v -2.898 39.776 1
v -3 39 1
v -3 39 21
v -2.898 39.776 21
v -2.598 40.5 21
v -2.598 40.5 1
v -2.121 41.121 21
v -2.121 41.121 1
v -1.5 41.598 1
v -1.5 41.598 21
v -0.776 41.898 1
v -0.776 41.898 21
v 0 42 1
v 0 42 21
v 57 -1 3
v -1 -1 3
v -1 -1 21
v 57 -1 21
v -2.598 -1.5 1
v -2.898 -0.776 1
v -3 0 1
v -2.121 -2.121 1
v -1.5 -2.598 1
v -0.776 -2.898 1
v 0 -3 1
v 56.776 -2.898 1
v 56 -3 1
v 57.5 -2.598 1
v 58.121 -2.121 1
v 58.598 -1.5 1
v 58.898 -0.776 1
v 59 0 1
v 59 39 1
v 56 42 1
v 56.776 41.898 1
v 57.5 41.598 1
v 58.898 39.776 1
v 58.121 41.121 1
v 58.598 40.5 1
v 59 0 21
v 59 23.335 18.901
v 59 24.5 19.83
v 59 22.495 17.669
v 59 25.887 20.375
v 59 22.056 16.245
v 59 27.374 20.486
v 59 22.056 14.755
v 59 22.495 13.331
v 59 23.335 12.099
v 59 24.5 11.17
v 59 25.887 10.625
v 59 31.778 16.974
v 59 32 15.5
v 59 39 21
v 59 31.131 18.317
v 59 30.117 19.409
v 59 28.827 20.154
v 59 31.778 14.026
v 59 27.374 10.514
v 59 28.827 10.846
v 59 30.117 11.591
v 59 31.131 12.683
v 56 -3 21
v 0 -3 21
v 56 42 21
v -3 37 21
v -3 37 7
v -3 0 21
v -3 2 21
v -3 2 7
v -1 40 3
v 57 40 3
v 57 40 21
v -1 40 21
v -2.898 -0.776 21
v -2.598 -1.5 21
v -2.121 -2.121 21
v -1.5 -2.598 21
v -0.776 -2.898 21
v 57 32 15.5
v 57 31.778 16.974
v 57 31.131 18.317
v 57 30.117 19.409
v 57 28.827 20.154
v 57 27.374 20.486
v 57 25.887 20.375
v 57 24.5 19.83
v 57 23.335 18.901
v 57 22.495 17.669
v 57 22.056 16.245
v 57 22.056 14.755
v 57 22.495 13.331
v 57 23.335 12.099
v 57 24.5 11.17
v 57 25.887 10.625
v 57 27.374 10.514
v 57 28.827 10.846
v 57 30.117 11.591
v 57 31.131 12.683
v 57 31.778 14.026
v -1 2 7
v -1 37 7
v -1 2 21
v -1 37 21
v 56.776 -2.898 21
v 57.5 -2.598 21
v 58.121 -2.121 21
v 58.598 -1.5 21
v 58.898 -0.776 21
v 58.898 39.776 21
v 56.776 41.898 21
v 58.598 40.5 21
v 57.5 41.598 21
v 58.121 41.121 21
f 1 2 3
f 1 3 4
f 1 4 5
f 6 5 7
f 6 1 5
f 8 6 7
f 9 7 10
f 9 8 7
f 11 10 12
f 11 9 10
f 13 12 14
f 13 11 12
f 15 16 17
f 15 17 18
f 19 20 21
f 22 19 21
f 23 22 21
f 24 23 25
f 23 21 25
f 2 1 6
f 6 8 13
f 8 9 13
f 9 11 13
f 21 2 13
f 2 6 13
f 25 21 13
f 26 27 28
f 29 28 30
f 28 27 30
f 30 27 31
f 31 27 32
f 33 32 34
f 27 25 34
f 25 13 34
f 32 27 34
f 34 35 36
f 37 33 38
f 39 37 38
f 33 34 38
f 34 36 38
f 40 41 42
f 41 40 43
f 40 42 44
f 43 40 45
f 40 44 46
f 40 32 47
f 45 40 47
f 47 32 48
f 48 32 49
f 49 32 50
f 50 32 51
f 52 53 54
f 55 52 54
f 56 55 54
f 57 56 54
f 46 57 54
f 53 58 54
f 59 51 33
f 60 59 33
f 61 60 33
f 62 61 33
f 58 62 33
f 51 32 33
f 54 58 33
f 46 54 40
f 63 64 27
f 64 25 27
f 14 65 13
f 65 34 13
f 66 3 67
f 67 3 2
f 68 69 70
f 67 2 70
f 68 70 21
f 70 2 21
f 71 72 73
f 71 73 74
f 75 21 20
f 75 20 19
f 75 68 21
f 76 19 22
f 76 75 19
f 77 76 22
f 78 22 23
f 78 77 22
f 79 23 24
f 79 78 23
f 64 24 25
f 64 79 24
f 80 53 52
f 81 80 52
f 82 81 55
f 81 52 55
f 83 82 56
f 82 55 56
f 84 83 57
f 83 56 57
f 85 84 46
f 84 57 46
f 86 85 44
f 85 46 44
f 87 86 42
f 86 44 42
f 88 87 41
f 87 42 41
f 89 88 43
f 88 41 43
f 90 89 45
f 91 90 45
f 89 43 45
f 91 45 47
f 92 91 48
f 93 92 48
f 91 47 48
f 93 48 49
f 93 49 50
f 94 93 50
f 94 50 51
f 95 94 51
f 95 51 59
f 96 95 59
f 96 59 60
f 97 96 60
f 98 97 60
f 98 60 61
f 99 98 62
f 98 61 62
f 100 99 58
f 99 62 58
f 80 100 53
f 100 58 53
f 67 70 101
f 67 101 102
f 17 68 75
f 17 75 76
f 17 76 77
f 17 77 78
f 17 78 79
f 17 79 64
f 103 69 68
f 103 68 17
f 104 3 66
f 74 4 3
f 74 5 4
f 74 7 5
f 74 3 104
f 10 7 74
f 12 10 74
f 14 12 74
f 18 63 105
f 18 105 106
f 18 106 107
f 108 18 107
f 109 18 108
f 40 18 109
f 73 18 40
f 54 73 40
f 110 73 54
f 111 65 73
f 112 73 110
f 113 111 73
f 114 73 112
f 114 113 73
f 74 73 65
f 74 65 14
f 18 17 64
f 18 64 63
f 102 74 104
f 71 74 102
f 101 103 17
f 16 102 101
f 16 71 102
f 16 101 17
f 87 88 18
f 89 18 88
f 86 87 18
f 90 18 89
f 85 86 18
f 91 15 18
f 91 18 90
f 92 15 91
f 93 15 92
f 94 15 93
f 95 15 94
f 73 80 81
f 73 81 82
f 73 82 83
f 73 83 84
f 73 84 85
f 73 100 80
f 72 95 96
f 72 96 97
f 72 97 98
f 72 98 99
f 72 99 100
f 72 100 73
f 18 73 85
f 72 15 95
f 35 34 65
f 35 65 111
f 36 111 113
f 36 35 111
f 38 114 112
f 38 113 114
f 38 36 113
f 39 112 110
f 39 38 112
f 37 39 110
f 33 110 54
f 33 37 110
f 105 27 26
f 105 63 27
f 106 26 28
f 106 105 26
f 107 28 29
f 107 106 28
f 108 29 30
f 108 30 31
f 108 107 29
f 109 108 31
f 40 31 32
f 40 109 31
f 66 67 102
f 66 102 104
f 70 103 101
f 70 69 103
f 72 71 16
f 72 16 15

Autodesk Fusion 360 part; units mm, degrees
sketch "Sketch1" plane through (0, 0, 0) normal (0, 0, 1) x (1, 0, 0)
  line L0 (-1, -1) -> (57, -1)
  line L1 (57, -1) -> (57, 40)
  line L2 (57, 40) -> (-1, 40)
  line L3 (-1, 40) -> (-1, -1)
  line L4 (-3, -3) -> (59, -3)
  line L5 (59, -3) -> (59, 42)
  line L6 (59, 42) -> (-3, 42)
  line L7 (-3, 42) -> (-3, -3)
extrude "Extrude1" add sketch "Sketch1" along normal blind 3 contours L0 L1 L2 L3 | L4 L5 L6 L7
extrude "Extrude2" add sketch "Sketch1" along normal blind 21
sketch "Sketch2" plane through (59, 0, 0) normal (1, 0, 0) x (0, 1, 0)
  line L0 (-3, 0) -> (42, 0)
  line L1 (42, 0) -> (42, 21)
  line L2 (42, 21) -> (-3, 21)
  line L3 (-3, 21) -> (-3, 0)
  line L4 (42, 0) -> (42, 15.5) construction
  line L5 (42, 15.5) -> (27, 15.5) construction
  circle A0 centre (27, 15.5) radius 5
  dimension "d11" = 15
extrude "Extrude3" cut sketch "Sketch2" against normal blind 3 contours A0
sketch "Sketch3" plane through (-3, 0, 0) normal (-1, 0, 0) x (0, -1, 0)
  line L0 (-42, 0) -> (3, 0)
  line L1 (3, 0) -> (3, 21)
  line L2 (3, 21) -> (-42, 21)
  line L3 (-42, 21) -> (-42, 0)
  line L4 (-37, 7) -> (-37, 21)
  line L5 (-37, 21) -> (-2, 21)
  line L6 (-2, 21) -> (-2, 7)
  line L7 (-2, 7) -> (-37, 7)
extrude "Extrude4" cut sketch "Sketch3" against normal blind 3 contours L2 L4 L5 L6 L7
fillet "Fillet1" radius 3 4 edges at (59, -3, 10.5) (59, 42, 10.5) (-3, 42, 10.5) (-3, -3, 10.5)
sketch "Sketch4" plane through (0, 0, 3) normal (0, 0, 1) x (-1, 0, 0)
  line L0 (1, 1) -> (-57, 1)
  line L1 (-57, 1) -> (-57, -40)
  line L2 (-57, -40) -> (1, -40)
  line L3 (1, -40) -> (1, 1)
  point P0 (-29.8405, -19.6761)
extrude "Extrude5" cut 1 faces at (37.3333, 12, 0) along direction (0, 0, 1) blind 1
sketch "Sketch5" plane through (0, 0, 3) normal (0, 0, 1) x (-1, 0, 0)
  line L0 (-8.2346, 0) -> (-7.3686, -1.5)
  line L1 (-7.3686, -1.5) -> (-5.0592, -1.5)
  line L2 (-5.0592, -1.5) -> (-4.1932, 0)
  line L3 (-0.7291, 0) -> (-3.0385, 0)
  line L4 (-3.0385, 0) -> (-4.1932, -2)
  line L5 (-4.1932, -2) -> (-3.0385, -4)
  line L6 (-3.0385, -4) -> (-0.7291, -4)
  line L7 (-0.7291, -4) -> (0, -2.7372)
  line L8 (0, -1.2628) -> (-0.7291, 0)
  line L9 (-16.8949, 0) -> (-16.0289, -1.5)
  line L10 (-16.0289, -1.5) -> (-13.7195, -1.5)
  line L11 (-13.7195, -1.5) -> (-12.8534, 0)
  line L12 (-9.3893, 0) -> (-11.6987, 0)
  line L13 (-11.6987, 0) -> (-12.8534, -2)
  line L14 (-12.8534, -2) -> (-11.6987, -4)
  line L15 (-11.6987, -4) -> (-9.3893, -4)
  line L16 (-9.3893, -4) -> (-8.2346, -2)
  line L17 (-8.2346, -2) -> (-9.3893, 0)
  line L18 (-5.0592, -2.5) -> (-7.3686, -2.5)
  line L19 (-7.3686, -2.5) -> (-8.5233, -4.5)
  line L20 (-8.5233, -4.5) -> (-7.3686, -6.5)
  line L21 (-7.3686, -6.5) -> (-5.0592, -6.5)
  line L22 (-5.0592, -6.5) -> (-3.9045, -4.5)
  line L23 (-3.9045, -4.5) -> (-5.0592, -2.5)
  line L24 (-0.7291, -5) -> (-3.0385, -5)
  line L25 (-3.0385, -5) -> (-4.1932, -7)
  line L26 (-4.1932, -7) -> (-3.0385, -9)
  line L27 (-3.0385, -9) -> (-0.7291, -9)
  line L28 (-0.7291, -9) -> (0, -7.7372)
  line L29 (0, -6.2628) -> (-0.7291, -5)
  line L30 (-25.5551, 0) -> (-24.6891, -1.5)
  line L31 (-24.6891, -1.5) -> (-22.3797, -1.5)
  line L32 (-22.3797, -1.5) -> (-21.5137, 0)
  line L33 (-18.0496, 0) -> (-20.359, 0)
  line L34 (-20.359, 0) -> (-21.5137, -2)
  line L35 (-21.5137, -2) -> (-20.359, -4)
  line L36 (-20.359, -4) -> (-18.0496, -4)
  line L37 (-18.0496, -4) -> (-16.8949, -2)
  line L38 (-16.8949, -2) -> (-18.0496, 0)
  line L39 (-13.7195, -2.5) -> (-16.0289, -2.5)
  line L40 (-16.0289, -2.5) -> (-17.1836, -4.5)
  line L41 (-17.1836, -4.5) -> (-16.0289, -6.5)
  line L42 (-16.0289, -6.5) -> (-13.7195, -6.5)
  line L43 (-13.7195, -6.5) -> (-12.5648, -4.5)
  line L44 (-12.5648, -4.5) -> (-13.7195, -2.5)
  line L45 (-9.3893, -5) -> (-11.6987, -5)
  line L46 (-11.6987, -5) -> (-12.8534, -7)
  line L47 (-12.8534, -7) -> (-11.6987, -9)
  line L48 (-11.6987, -9) -> (-9.3893, -9)
  line L49 (-9.3893, -9) -> (-8.2346, -7)
  line L50 (-8.2346, -7) -> (-9.3893, -5)
  line L51 (-5.0592, -7.5) -> (-7.3686, -7.5)
  line L52 (-7.3686, -7.5) -> (-8.5233, -9.5)
  line L53 (-8.5233, -9.5) -> (-7.3686, -11.5)
  line L54 (-7.3686, -11.5) -> (-5.0592, -11.5)
  line L55 (-5.0592, -11.5) -> (-3.9045, -9.5)
  line L56 (-3.9045, -9.5) -> (-5.0592, -7.5)
  line L57 (-0.7291, -10) -> (-3.0385, -10)
  line L58 (-3.0385, -10) -> (-4.1932, -12)
  line L59 (-4.1932, -12) -> (-3.0385, -14)
  line L60 (-3.0385, -14) -> (-0.7291, -14)
  line L61 (-0.7291, -14) -> (0, -12.7372)
  line L62 (0, -11.2628) -> (-0.7291, -10)
  line L63 (-34.2154, 0) -> (-33.3494, -1.5)
  line L64 (-33.3494, -1.5) -> (-31.04, -1.5)
  line L65 (-31.04, -1.5) -> (-30.1739, 0)
  line L66 (-26.7098, 0) -> (-29.0192, 0)
  line L67 (-29.0192, 0) -> (-30.1739, -2)
  line L68 (-30.1739, -2) -> (-29.0192, -4)
  line L69 (-29.0192, -4) -> (-26.7098, -4)
  line L70 (-26.7098, -4) -> (-25.5551, -2)
  line L71 (-25.5551, -2) -> (-26.7098, 0)
  line L72 (-22.3797, -2.5) -> (-24.6891, -2.5)
  line L73 (-24.6891, -2.5) -> (-25.8438, -4.5)
  line L74 (-25.8438, -4.5) -> (-24.6891, -6.5)
  line L75 (-24.6891, -6.5) -> (-22.3797, -6.5)
  line L76 (-22.3797, -6.5) -> (-21.225, -4.5)
  line L77 (-21.225, -4.5) -> (-22.3797, -2.5)
  line L78 (-18.0496, -5) -> (-20.359, -5)
  line L79 (-20.359, -5) -> (-21.5137, -7)
  line L80 (-21.5137, -7) -> (-20.359, -9)
  line L81 (-20.359, -9) -> (-18.0496, -9)
  line L82 (-18.0496, -9) -> (-16.8949, -7)
  line L83 (-16.8949, -7) -> (-18.0496, -5)
  line L84 (-13.7195, -7.5) -> (-16.0289, -7.5)
  line L85 (-16.0289, -7.5) -> (-17.1836, -9.5)
  line L86 (-17.1836, -9.5) -> (-16.0289, -11.5)
  line L87 (-16.0289, -11.5) -> (-13.7195, -11.5)
  line L88 (-13.7195, -11.5) -> (-12.5648, -9.5)
  line L89 (-12.5648, -9.5) -> (-13.7195, -7.5)
  line L90 (-9.3893, -10) -> (-11.6987, -10)
  line L91 (-11.6987, -10) -> (-12.8534, -12)
  line L92 (-12.8534, -12) -> (-11.6987, -14)
  line L93 (-11.6987, -14) -> (-9.3893, -14)
  line L94 (-9.3893, -14) -> (-8.2346, -12)
  line L95 (-8.2346, -12) -> (-9.3893, -10)
  line L96 (-5.0592, -12.5) -> (-7.3686, -12.5)
  line L97 (-7.3686, -12.5) -> (-8.5233, -14.5)
  line L98 (-8.5233, -14.5) -> (-7.3686, -16.5)
  line L99 (-7.3686, -16.5) -> (-5.0592, -16.5)
  line L100 (-5.0592, -16.5) -> (-3.9045, -14.5)
  line L101 (-3.9045, -14.5) -> (-5.0592, -12.5)
  line L102 (-0.7291, -15) -> (-3.0385, -15)
  line L103 (-3.0385, -15) -> (-4.1932, -17)
  line L104 (-4.1932, -17) -> (-3.0385, -19)
  line L105 (-3.0385, -19) -> (-0.7291, -19)
  line L106 (-0.7291, -19) -> (0, -17.7372)
  line L107 (0, -16.2628) -> (-0.7291, -15)
  line L108 (-42.8756, 0) -> (-42.0096, -1.5)
  line L109 (-42.0096, -1.5) -> (-39.7002, -1.5)
  line L110 (-39.7002, -1.5) -> (-38.8342, 0)
  line L111 (-35.3701, 0) -> (-37.6795, 0)
  line L112 (-37.6795, 0) -> (-38.8342, -2)
  line L113 (-38.8342, -2) -> (-37.6795, -4)
  line L114 (-37.6795, -4) -> (-35.3701, -4)
  line L115 (-35.3701, -4) -> (-34.2154, -2)
  line L116 (-34.2154, -2) -> (-35.3701, 0)
  line L117 (-31.04, -2.5) -> (-33.3494, -2.5)
  line L118 (-33.3494, -2.5) -> (-34.5041, -4.5)
  line L119 (-34.5041, -4.5) -> (-33.3494, -6.5)
  line L120 (-33.3494, -6.5) -> (-31.04, -6.5)
  line L121 (-31.04, -6.5) -> (-29.8853, -4.5)
  line L122 (-29.8853, -4.5) -> (-31.04, -2.5)
  line L123 (-26.7098, -5) -> (-29.0192, -5)
  line L124 (-29.0192, -5) -> (-30.1739, -7)
  line L125 (-30.1739, -7) -> (-29.0192, -9)
  line L126 (-29.0192, -9) -> (-26.7098, -9)
  line L127 (-26.7098, -9) -> (-25.5551, -7)
  line L128 (-25.5551, -7) -> (-26.7098, -5)
  line L129 (-22.3797, -7.5) -> (-24.6891, -7.5)
  line L130 (-24.6891, -7.5) -> (-25.8438, -9.5)
  line L131 (-25.8438, -9.5) -> (-24.6891, -11.5)
  line L132 (-24.6891, -11.5) -> (-22.3797, -11.5)
  line L133 (-22.3797, -11.5) -> (-21.225, -9.5)
  line L134 (-21.225, -9.5) -> (-22.3797, -7.5)
  line L135 (-18.0496, -10) -> (-20.359, -10)
  line L136 (-20.359, -10) -> (-21.5137, -12)
  line L137 (-21.5137, -12) -> (-20.359, -14)
  line L138 (-20.359, -14) -> (-18.0496, -14)
  line L139 (-18.0496, -14) -> (-16.8949, -12)
  line L140 (-16.8949, -12) -> (-18.0496, -10)
  line L141 (-13.7195, -12.5) -> (-16.0289, -12.5)
  line L142 (-16.0289, -12.5) -> (-17.1836, -14.5)
  line L143 (-17.1836, -14.5) -> (-16.0289, -16.5)
  line L144 (-16.0289, -16.5) -> (-13.7195, -16.5)
  line L145 (-13.7195, -16.5) -> (-12.5648, -14.5)
  line L146 (-12.5648, -14.5) -> (-13.7195, -12.5)
  line L147 (-9.3893, -15) -> (-11.6987, -15)
  line L148 (-11.6987, -15) -> (-12.8534, -17)
  line L149 (-12.8534, -17) -> (-11.6987, -19)
  line L150 (-11.6987, -19) -> (-9.3893, -19)
  line L151 (-9.3893, -19) -> (-8.2346, -17)
  line L152 (-8.2346, -17) -> (-9.3893, -15)
  line L153 (-5.0592, -17.5) -> (-7.3686, -17.5)
  line L154 (-7.3686, -17.5) -> (-8.5233, -19.5)
  line L155 (-8.5233, -19.5) -> (-7.3686, -21.5)
  line L156 (-7.3686, -21.5) -> (-5.0592, -21.5)
  line L157 (-5.0592, -21.5) -> (-3.9045, -19.5)
  line L158 (-3.9045, -19.5) -> (-5.0592, -17.5)
  line L159 (-0.7291, -20) -> (-3.0385, -20)
  line L160 (-3.0385, -20) -> (-4.1932, -22)
  line L161 (-4.1932, -22) -> (-3.0385, -24)
  line L162 (-3.0385, -24) -> (-0.7291, -24)
  line L163 (-0.7291, -24) -> (0, -22.7372)
  line L164 (0, -21.2628) -> (-0.7291, -20)
  line L165 (-51.5359, 0) -> (-50.6699, -1.5)
  line L166 (-50.6699, -1.5) -> (-48.3605, -1.5)
  line L167 (-48.3605, -1.5) -> (-47.4944, 0)
  line L168 (-44.0303, 0) -> (-46.3397, 0)
  line L169 (-46.3397, 0) -> (-47.4944, -2)
  line L170 (-47.4944, -2) -> (-46.3397, -4)
  line L171 (-46.3397, -4) -> (-44.0303, -4)
  line L172 (-44.0303, -4) -> (-42.8756, -2)
  line L173 (-42.8756, -2) -> (-44.0303, 0)
  line L174 (-39.7002, -2.5) -> (-42.0096, -2.5)
  line L175 (-42.0096, -2.5) -> (-43.1643, -4.5)
  line L176 (-43.1643, -4.5) -> (-42.0096, -6.5)
  line L177 (-42.0096, -6.5) -> (-39.7002, -6.5)
  line L178 (-39.7002, -6.5) -> (-38.5455, -4.5)
  line L179 (-38.5455, -4.5) -> (-39.7002, -2.5)
  line L180 (-35.3701, -5) -> (-37.6795, -5)
  line L181 (-37.6795, -5) -> (-38.8342, -7)
  line L182 (-38.8342, -7) -> (-37.6795, -9)
  line L183 (-37.6795, -9) -> (-35.3701, -9)
  line L184 (-35.3701, -9) -> (-34.2154, -7)
  line L185 (-34.2154, -7) -> (-35.3701, -5)
  line L186 (-31.04, -7.5) -> (-33.3494, -7.5)
  line L187 (-33.3494, -7.5) -> (-34.5041, -9.5)
  line L188 (-34.5041, -9.5) -> (-33.3494, -11.5)
  line L189 (-33.3494, -11.5) -> (-31.04, -11.5)
  line L190 (-31.04, -11.5) -> (-29.8853, -9.5)
  line L191 (-29.8853, -9.5) -> (-31.04, -7.5)
  line L192 (-26.7098, -10) -> (-29.0192, -10)
  line L193 (-29.0192, -10) -> (-30.1739, -12)
  line L194 (-30.1739, -12) -> (-29.0192, -14)
  line L195 (-29.0192, -14) -> (-26.7098, -14)
  line L196 (-26.7098, -14) -> (-25.5551, -12)
  line L197 (-25.5551, -12) -> (-26.7098, -10)
  line L198 (-22.3797, -12.5) -> (-24.6891, -12.5)
  line L199 (-24.6891, -12.5) -> (-25.8438, -14.5)
  line L200 (-25.8438, -14.5) -> (-24.6891, -16.5)
  line L201 (-24.6891, -16.5) -> (-22.3797, -16.5)
  line L202 (-22.3797, -16.5) -> (-21.225, -14.5)
  line L203 (-21.225, -14.5) -> (-22.3797, -12.5)
  line L204 (-18.0496, -15) -> (-20.359, -15)
  line L205 (-20.359, -15) -> (-21.5137, -17)
  line L206 (-21.5137, -17) -> (-20.359, -19)
  line L207 (-20.359, -19) -> (-18.0496, -19)
  line L208 (-18.0496, -19) -> (-16.8949, -17)
  line L209 (-16.8949, -17) -> (-18.0496, -15)
  line L210 (-13.7195, -17.5) -> (-16.0289, -17.5)
  line L211 (-16.0289, -17.5) -> (-17.1836, -19.5)
  line L212 (-17.1836, -19.5) -> (-16.0289, -21.5)
  line L213 (-16.0289, -21.5) -> (-13.7195, -21.5)
  line L214 (-13.7195, -21.5) -> (-12.5648, -19.5)
  line L215 (-12.5648, -19.5) -> (-13.7195, -17.5)
  line L216 (-9.3893, -20) -> (-11.6987, -20)
  line L217 (-11.6987, -20) -> (-12.8534, -22)
  line L218 (-12.8534, -22) -> (-11.6987, -24)
  line L219 (-11.6987, -24) -> (-9.3893, -24)
  line L220 (-9.3893, -24) -> (-8.2346, -22)
  line L221 (-8.2346, -22) -> (-9.3893, -20)
  line L222 (-5.0592, -22.5) -> (-7.3686, -22.5)
  line L223 (-7.3686, -22.5) -> (-8.5233, -24.5)
  line L224 (-8.5233, -24.5) -> (-7.3686, -26.5)
  line L225 (-7.3686, -26.5) -> (-5.0592, -26.5)
  line L226 (-5.0592, -26.5) -> (-3.9045, -24.5)
  line L227 (-3.9045, -24.5) -> (-5.0592, -22.5)
  line L228 (-0.7291, -25) -> (-3.0385, -25)
  line L229 (-3.0385, -25) -> (-4.1932, -27)
  line L230 (-4.1932, -27) -> (-3.0385, -29)
  line L231 (-3.0385, -29) -> (-0.7291, -29)
  line L232 (-0.7291, -29) -> (0, -27.7372)
  line L233 (0, -26.2628) -> (-0.7291, -25)
  line L234 (-52.6906, 0) -> (-55, 0)
  line L235 (-55, 0) -> (-56, -1.7321)
  line L236 (-56, -2.2679) -> (-55, -4)
  line L237 (-55, -4) -> (-52.6906, -4)
  line L238 (-52.6906, -4) -> (-51.5359, -2)
  line L239 (-51.5359, -2) -> (-52.6906, 0)
  line L240 (-48.3605, -2.5) -> (-50.6699, -2.5)
  line L241 (-50.6699, -2.5) -> (-51.8246, -4.5)
  line L242 (-51.8246, -4.5) -> (-50.6699, -6.5)
  line L243 (-50.6699, -6.5) -> (-48.3605, -6.5)
  line L244 (-48.3605, -6.5) -> (-47.2058, -4.5)
  line L245 (-47.2058, -4.5) -> (-48.3605, -2.5)
  line L246 (-44.0303, -5) -> (-46.3397, -5)
  line L247 (-46.3397, -5) -> (-47.4944, -7)
  line L248 (-47.4944, -7) -> (-46.3397, -9)
  line L249 (-46.3397, -9) -> (-44.0303, -9)
  line L250 (-44.0303, -9) -> (-42.8756, -7)
  line L251 (-42.8756, -7) -> (-44.0303, -5)
  line L252 (-39.7002, -7.5) -> (-42.0096, -7.5)
  line L253 (-42.0096, -7.5) -> (-43.1643, -9.5)
  line L254 (-43.1643, -9.5) -> (-42.0096, -11.5)
  line L255 (-42.0096, -11.5) -> (-39.7002, -11.5)
  line L256 (-39.7002, -11.5) -> (-38.5455, -9.5)
  line L257 (-38.5455, -9.5) -> (-39.7002, -7.5)
  line L258 (-35.3701, -10) -> (-37.6795, -10)
  line L259 (-37.6795, -10) -> (-38.8342, -12)
  line L260 (-38.8342, -12) -> (-37.6795, -14)
  line L261 (-37.6795, -14) -> (-35.3701, -14)
  line L262 (-35.3701, -14) -> (-34.2154, -12)
  line L263 (-34.2154, -12) -> (-35.3701, -10)
  line L264 (-31.04, -12.5) -> (-33.3494, -12.5)
  line L265 (-33.3494, -12.5) -> (-34.5041, -14.5)
  line L266 (-34.5041, -14.5) -> (-33.3494, -16.5)
  line L267 (-33.3494, -16.5) -> (-31.04, -16.5)
  line L268 (-31.04, -16.5) -> (-29.8853, -14.5)
  line L269 (-29.8853, -14.5) -> (-31.04, -12.5)
  line L270 (-26.7098, -15) -> (-29.0192, -15)
  line L271 (-29.0192, -15) -> (-30.1739, -17)
  line L272 (-30.1739, -17) -> (-29.0192, -19)
  line L273 (-29.0192, -19) -> (-26.7098, -19)
  line L274 (-26.7098, -19) -> (-25.5551, -17)
  line L275 (-25.5551, -17) -> (-26.7098, -15)
  line L276 (-22.3797, -17.5) -> (-24.6891, -17.5)
  line L277 (-24.6891, -17.5) -> (-25.8438, -19.5)
  line L278 (-25.8438, -19.5) -> (-24.6891, -21.5)
  line L279 (-24.6891, -21.5) -> (-22.3797, -21.5)
  line L280 (-22.3797, -21.5) -> (-21.225, -19.5)
  line L281 (-21.225, -19.5) -> (-22.3797, -17.5)
  line L282 (-18.0496, -20) -> (-20.359, -20)
  line L283 (-20.359, -20) -> (-21.5137, -22)
  line L284 (-21.5137, -22) -> (-20.359, -24)
  line L285 (-20.359, -24) -> (-18.0496, -24)
  line L286 (-18.0496, -24) -> (-16.8949, -22)
  line L287 (-16.8949, -22) -> (-18.0496, -20)
  line L288 (-13.7195, -22.5) -> (-16.0289, -22.5)
  line L289 (-16.0289, -22.5) -> (-17.1836, -24.5)
  line L290 (-17.1836, -24.5) -> (-16.0289, -26.5)
  line L291 (-16.0289, -26.5) -> (-13.7195, -26.5)
  line L292 (-13.7195, -26.5) -> (-12.5648, -24.5)
  line L293 (-12.5648, -24.5) -> (-13.7195, -22.5)
  line L294 (-9.3893, -25) -> (-11.6987, -25)
  line L295 (-11.6987, -25) -> (-12.8534, -27)
  line L296 (-12.8534, -27) -> (-11.6987, -29)
  line L297 (-11.6987, -29) -> (-9.3893, -29)
  line L298 (-9.3893, -29) -> (-8.2346, -27)
  line L299 (-8.2346, -27) -> (-9.3893, -25)
  line L300 (-5.0592, -27.5) -> (-7.3686, -27.5)
  line L301 (-7.3686, -27.5) -> (-8.5233, -29.5)
  line L302 (-8.5233, -29.5) -> (-7.3686, -31.5)
  line L303 (-7.3686, -31.5) -> (-5.0592, -31.5)
  line L304 (-5.0592, -31.5) -> (-3.9045, -29.5)
  line L305 (-3.9045, -29.5) -> (-5.0592, -27.5)
  line L306 (-0.7291, -30) -> (-3.0385, -30)
  line L307 (-3.0385, -30) -> (-4.1932, -32)
  line L308 (-4.1932, -32) -> (-3.0385, -34)
  line L309 (-3.0385, -34) -> (-0.7291, -34)
  line L310 (-0.7291, -34) -> (0, -32.7372)
  line L311 (0, -31.2628) -> (-0.7291, -30)
  line L312 (-52.6906, -5) -> (-55, -5)
  line L313 (-55, -5) -> (-56, -6.7321)
  line L314 (-56, -7.2679) -> (-55, -9)
  line L315 (-55, -9) -> (-52.6906, -9)
  line L316 (-52.6906, -9) -> (-51.5359, -7)
  line L317 (-51.5359, -7) -> (-52.6906, -5)
  line L318 (-48.3605, -7.5) -> (-50.6699, -7.5)
  line L319 (-50.6699, -7.5) -> (-51.8246, -9.5)
  line L320 (-51.8246, -9.5) -> (-50.6699, -11.5)
  line L321 (-50.6699, -11.5) -> (-48.3605, -11.5)
  line L322 (-48.3605, -11.5) -> (-47.2058, -9.5)
  line L323 (-47.2058, -9.5) -> (-48.3605, -7.5)
  line L324 (-44.0303, -10) -> (-46.3397, -10)
  line L325 (-46.3397, -10) -> (-47.4944, -12)
  line L326 (-47.4944, -12) -> (-46.3397, -14)
  line L327 (-46.3397, -14) -> (-44.0303, -14)
  line L328 (-44.0303, -14) -> (-42.8756, -12)
  line L329 (-42.8756, -12) -> (-44.0303, -10)
  line L330 (-39.7002, -12.5) -> (-42.0096, -12.5)
  line L331 (-42.0096, -12.5) -> (-43.1643, -14.5)
  line L332 (-43.1643, -14.5) -> (-42.0096, -16.5)
  line L333 (-42.0096, -16.5) -> (-39.7002, -16.5)
  line L334 (-39.7002, -16.5) -> (-38.5455, -14.5)
  line L335 (-38.5455, -14.5) -> (-39.7002, -12.5)
  line L336 (-35.3701, -15) -> (-37.6795, -15)
  line L337 (-37.6795, -15) -> (-38.8342, -17)
  line L338 (-38.8342, -17) -> (-37.6795, -19)
  line L339 (-37.6795, -19) -> (-35.3701, -19)
  line L340 (-35.3701, -19) -> (-34.2154, -17)
  line L341 (-34.2154, -17) -> (-35.3701, -15)
  line L342 (-31.04, -17.5) -> (-33.3494, -17.5)
  line L343 (-33.3494, -17.5) -> (-34.5041, -19.5)
  line L344 (-34.5041, -19.5) -> (-33.3494, -21.5)
  line L345 (-33.3494, -21.5) -> (-31.04, -21.5)
  line L346 (-31.04, -21.5) -> (-29.8853, -19.5)
  line L347 (-29.8853, -19.5) -> (-31.04, -17.5)
  line L348 (-26.7098, -20) -> (-29.0192, -20)
  line L349 (-29.0192, -20) -> (-30.1739, -22)
  line L350 (-30.1739, -22) -> (-29.0192, -24)
  line L351 (-29.0192, -24) -> (-26.7098, -24)
  line L352 (-26.7098, -24) -> (-25.5551, -22)
  line L353 (-25.5551, -22) -> (-26.7098, -20)
  line L354 (-22.3797, -22.5) -> (-24.6891, -22.5)
  line L355 (-24.6891, -22.5) -> (-25.8438, -24.5)
  line L356 (-25.8438, -24.5) -> (-24.6891, -26.5)
  line L357 (-24.6891, -26.5) -> (-22.3797, -26.5)
  line L358 (-22.3797, -26.5) -> (-21.225, -24.5)
  line L359 (-21.225, -24.5) -> (-22.3797, -22.5)
  line L360 (-18.0496, -25) -> (-20.359, -25)
  line L361 (-20.359, -25) -> (-21.5137, -27)
  line L362 (-21.5137, -27) -> (-20.359, -29)
  line L363 (-20.359, -29) -> (-18.0496, -29)
  line L364 (-18.0496, -29) -> (-16.8949, -27)
  line L365 (-16.8949, -27) -> (-18.0496, -25)
  line L366 (-13.7195, -27.5) -> (-16.0289, -27.5)
  line L367 (-16.0289, -27.5) -> (-17.1836, -29.5)
  line L368 (-17.1836, -29.5) -> (-16.0289, -31.5)
  line L369 (-16.0289, -31.5) -> (-13.7195, -31.5)
  line L370 (-13.7195, -31.5) -> (-12.5648, -29.5)
  line L371 (-12.5648, -29.5) -> (-13.7195, -27.5)
  line L372 (-9.3893, -30) -> (-11.6987, -30)
  line L373 (-11.6987, -30) -> (-12.8534, -32)
  line L374 (-12.8534, -32) -> (-11.6987, -34)
  line L375 (-11.6987, -34) -> (-9.3893, -34)
  line L376 (-9.3893, -34) -> (-8.2346, -32)
  line L377 (-8.2346, -32) -> (-9.3893, -30)
  line L378 (-5.0592, -32.5) -> (-7.3686, -32.5)
  line L379 (-7.3686, -32.5) -> (-8.5233, -34.5)
  line L380 (-8.5233, -34.5) -> (-7.3686, -36.5)
  line L381 (-7.3686, -36.5) -> (-5.0592, -36.5)
  line L382 (-5.0592, -36.5) -> (-3.9045, -34.5)
  line L383 (-3.9045, -34.5) -> (-5.0592, -32.5)
  line L384 (-0.7291, -35) -> (-3.0385, -35)
  line L385 (-3.0385, -35) -> (-4.1932, -37)
  line L386 (-4.1932, -37) -> (-3.0385, -39)
  line L387 (-3.0385, -39) -> (-0.7291, -39)
  line L388 (-0.7291, -39) -> (0, -37.7372)
  line L389 (0, -36.2628) -> (-0.7291, -35)
  line L390 (-52.6906, -10) -> (-55, -10)
  line L391 (-55, -10) -> (-56, -11.7321)
  line L392 (-56, -12.2679) -> (-55, -14)
  line L393 (-55, -14) -> (-52.6906, -14)
  line L394 (-52.6906, -14) -> (-51.5359, -12)
  line L395 (-51.5359, -12) -> (-52.6906, -10)
  line L396 (-48.3605, -12.5) -> (-50.6699, -12.5)
  line L397 (-50.6699, -12.5) -> (-51.8246, -14.5)
  line L398 (-51.8246, -14.5) -> (-50.6699, -16.5)
  line L399 (-50.6699, -16.5) -> (-48.3605, -16.5)
  line L400 (-48.3605, -16.5) -> (-47.2058, -14.5)
  line L401 (-47.2058, -14.5) -> (-48.3605, -12.5)
  line L402 (-44.0303, -15) -> (-46.3397, -15)
  line L403 (-46.3397, -15) -> (-47.4944, -17)
  line L404 (-47.4944, -17) -> (-46.3397, -19)
  line L405 (-46.3397, -19) -> (-44.0303, -19)
  line L406 (-44.0303, -19) -> (-42.8756, -17)
  line L407 (-42.8756, -17) -> (-44.0303, -15)
  line L408 (-39.7002, -17.5) -> (-42.0096, -17.5)
  line L409 (-42.0096, -17.5) -> (-43.1643, -19.5)
  line L410 (-43.1643, -19.5) -> (-42.0096, -21.5)
  line L411 (-42.0096, -21.5) -> (-39.7002, -21.5)
  line L412 (-39.7002, -21.5) -> (-38.5455, -19.5)
  line L413 (-38.5455, -19.5) -> (-39.7002, -17.5)
  line L414 (-35.3701, -20) -> (-37.6795, -20)
  line L415 (-37.6795, -20) -> (-38.8342, -22)
  line L416 (-38.8342, -22) -> (-37.6795, -24)
  line L417 (-37.6795, -24) -> (-35.3701, -24)
  line L418 (-35.3701, -24) -> (-34.2154, -22)
  line L419 (-34.2154, -22) -> (-35.3701, -20)
  line L420 (-31.04, -22.5) -> (-33.3494, -22.5)
  line L421 (-33.3494, -22.5) -> (-34.5041, -24.5)
  line L422 (-34.5041, -24.5) -> (-33.3494, -26.5)
  line L423 (-33.3494, -26.5) -> (-31.04, -26.5)
  line L424 (-31.04, -26.5) -> (-29.8853, -24.5)
  line L425 (-29.8853, -24.5) -> (-31.04, -22.5)
  line L426 (-26.7098, -25) -> (-29.0192, -25)
  line L427 (-29.0192, -25) -> (-30.1739, -27)
  line L428 (-30.1739, -27) -> (-29.0192, -29)
  line L429 (-29.0192, -29) -> (-26.7098, -29)
  line L430 (-26.7098, -29) -> (-25.5551, -27)
  line L431 (-25.5551, -27) -> (-26.7098, -25)
  line L432 (-22.3797, -27.5) -> (-24.6891, -27.5)
  line L433 (-24.6891, -27.5) -> (-25.8438, -29.5)
  line L434 (-25.8438, -29.5) -> (-24.6891, -31.5)
  line L435 (-24.6891, -31.5) -> (-22.3797, -31.5)
  line L436 (-22.3797, -31.5) -> (-21.225, -29.5)
  line L437 (-21.225, -29.5) -> (-22.3797, -27.5)
  line L438 (-18.0496, -30) -> (-20.359, -30)
  line L439 (-20.359, -30) -> (-21.5137, -32)
  line L440 (-21.5137, -32) -> (-20.359, -34)
  line L441 (-20.359, -34) -> (-18.0496, -34)
  line L442 (-18.0496, -34) -> (-16.8949, -32)
  line L443 (-16.8949, -32) -> (-18.0496, -30)
  line L444 (-13.7195, -32.5) -> (-16.0289, -32.5)
  line L445 (-16.0289, -32.5) -> (-17.1836, -34.5)
  line L446 (-17.1836, -34.5) -> (-16.0289, -36.5)
  line L447 (-16.0289, -36.5) -> (-13.7195, -36.5)
  line L448 (-13.7195, -36.5) -> (-12.5648, -34.5)
  line L449 (-12.5648, -34.5) -> (-13.7195, -32.5)
  line L450 (-9.3893, -35) -> (-11.6987, -35)
  line L451 (-11.6987, -35) -> (-12.8534, -37)
  line L452 (-12.8534, -37) -> (-11.6987, -39)
  line L453 (-11.6987, -39) -> (-9.3893, -39)
  line L454 (-9.3893, -39) -> (-8.2346, -37)
  line L455 (-8.2346, -37) -> (-9.3893, -35)
  line L456 (-5.0592, -37.5) -> (-7.3686, -37.5)
  line L457 (-7.3686, -37.5) -> (-8.2346, -39)
  line L458 (-4.1932, -39) -> (-5.0592, -37.5)
  line L459 (-52.6906, -15) -> (-55, -15)
  line L460 (-55, -15) -> (-56, -16.7321)
  line L461 (-56, -17.2679) -> (-55, -19)
  line L462 (-55, -19) -> (-52.6906, -19)
  line L463 (-52.6906, -19) -> (-51.5359, -17)
  line L464 (-51.5359, -17) -> (-52.6906, -15)
  line L465 (-48.3605, -17.5) -> (-50.6699, -17.5)
  line L466 (-50.6699, -17.5) -> (-51.8246, -19.5)
  line L467 (-51.8246, -19.5) -> (-50.6699, -21.5)
  line L468 (-50.6699, -21.5) -> (-48.3605, -21.5)
  line L469 (-48.3605, -21.5) -> (-47.2058, -19.5)
  line L470 (-47.2058, -19.5) -> (-48.3605, -17.5)
  line L471 (-44.0303, -20) -> (-46.3397, -20)
  line L472 (-46.3397, -20) -> (-47.4944, -22)
  line L473 (-47.4944, -22) -> (-46.3397, -24)
  line L474 (-46.3397, -24) -> (-44.0303, -24)
  line L475 (-44.0303, -24) -> (-42.8756, -22)
  line L476 (-42.8756, -22) -> (-44.0303, -20)
  line L477 (-39.7002, -22.5) -> (-42.0096, -22.5)
  line L478 (-42.0096, -22.5) -> (-43.1643, -24.5)
  line L479 (-43.1643, -24.5) -> (-42.0096, -26.5)
  line L480 (-42.0096, -26.5) -> (-39.7002, -26.5)
  line L481 (-39.7002, -26.5) -> (-38.5455, -24.5)
  line L482 (-38.5455, -24.5) -> (-39.7002, -22.5)
  line L483 (-35.3701, -25) -> (-37.6795, -25)
  line L484 (-37.6795, -25) -> (-38.8342, -27)
  line L485 (-38.8342, -27) -> (-37.6795, -29)
  line L486 (-37.6795, -29) -> (-35.3701, -29)
  line L487 (-35.3701, -29) -> (-34.2154, -27)
  line L488 (-34.2154, -27) -> (-35.3701, -25)
  line L489 (-31.04, -27.5) -> (-33.3494, -27.5)
  line L490 (-33.3494, -27.5) -> (-34.5041, -29.5)
  line L491 (-34.5041, -29.5) -> (-33.3494, -31.5)
  line L492 (-33.3494, -31.5) -> (-31.04, -31.5)
  line L493 (-31.04, -31.5) -> (-29.8853, -29.5)
  line L494 (-29.8853, -29.5) -> (-31.04, -27.5)
  line L495 (-26.7098, -30) -> (-29.0192, -30)
  line L496 (-29.0192, -30) -> (-30.1739, -32)
  line L497 (-30.1739, -32) -> (-29.0192, -34)
  line L498 (-29.0192, -34) -> (-26.7098, -34)
  line L499 (-26.7098, -34) -> (-25.5551, -32)
  line L500 (-25.5551, -32) -> (-26.7098, -30)
  line L501 (-22.3797, -32.5) -> (-24.6891, -32.5)
  line L502 (-24.6891, -32.5) -> (-25.8438, -34.5)
  line L503 (-25.8438, -34.5) -> (-24.6891, -36.5)
  line L504 (-24.6891, -36.5) -> (-22.3797, -36.5)
  line L505 (-22.3797, -36.5) -> (-21.225, -34.5)
  line L506 (-21.225, -34.5) -> (-22.3797, -32.5)
  line L507 (-18.0496, -35) -> (-20.359, -35)
  line L508 (-20.359, -35) -> (-21.5137, -37)
  line L509 (-21.5137, -37) -> (-20.359, -39)
  line L510 (-20.359, -39) -> (-18.0496, -39)
  line L511 (-18.0496, -39) -> (-16.8949, -37)
  line L512 (-16.8949, -37) -> (-18.0496, -35)
  line L513 (-13.7195, -37.5) -> (-16.0289, -37.5)
  line L514 (-16.0289, -37.5) -> (-16.8949, -39)
  line L515 (-12.8534, -39) -> (-13.7195, -37.5)
  line L516 (-52.6906, -20) -> (-55, -20)
  line L517 (-55, -20) -> (-56, -21.7321)
  line L518 (-56, -22.2679) -> (-55, -24)
  line L519 (-55, -24) -> (-52.6906, -24)
  line L520 (-52.6906, -24) -> (-51.5359, -22)
  line L521 (-51.5359, -22) -> (-52.6906, -20)
  line L522 (-48.3605, -22.5) -> (-50.6699, -22.5)
  line L523 (-50.6699, -22.5) -> (-51.8246, -24.5)
  line L524 (-51.8246, -24.5) -> (-50.6699, -26.5)
  line L525 (-50.6699, -26.5) -> (-48.3605, -26.5)
  line L526 (-48.3605, -26.5) -> (-47.2058, -24.5)
  line L527 (-47.2058, -24.5) -> (-48.3605, -22.5)
  line L528 (-44.0303, -25) -> (-46.3397, -25)
  line L529 (-46.3397, -25) -> (-47.4944, -27)
  line L530 (-47.4944, -27) -> (-46.3397, -29)
  line L531 (-46.3397, -29) -> (-44.0303, -29)
  line L532 (-44.0303, -29) -> (-42.8756, -27)
  line L533 (-42.8756, -27) -> (-44.0303, -25)
  line L534 (-39.7002, -27.5) -> (-42.0096, -27.5)
  line L535 (-42.0096, -27.5) -> (-43.1643, -29.5)
  line L536 (-43.1643, -29.5) -> (-42.0096, -31.5)
  line L537 (-42.0096, -31.5) -> (-39.7002, -31.5)
  line L538 (-39.7002, -31.5) -> (-38.5455, -29.5)
  line L539 (-38.5455, -29.5) -> (-39.7002, -27.5)
  line L540 (-35.3701, -30) -> (-37.6795, -30)
  line L541 (-37.6795, -30) -> (-38.8342, -32)
  line L542 (-38.8342, -32) -> (-37.6795, -34)
  line L543 (-37.6795, -34) -> (-35.3701, -34)
  line L544 (-35.3701, -34) -> (-34.2154, -32)
  line L545 (-34.2154, -32) -> (-35.3701, -30)
  line L546 (-31.04, -32.5) -> (-33.3494, -32.5)
  line L547 (-33.3494, -32.5) -> (-34.5041, -34.5)
  line L548 (-34.5041, -34.5) -> (-33.3494, -36.5)
  line L549 (-33.3494, -36.5) -> (-31.04, -36.5)
  line L550 (-31.04, -36.5) -> (-29.8853, -34.5)
  line L551 (-29.8853, -34.5) -> (-31.04, -32.5)
  line L552 (-26.7098, -35) -> (-29.0192, -35)
  line L553 (-29.0192, -35) -> (-30.1739, -37)
  line L554 (-30.1739, -37) -> (-29.0192, -39)
  line L555 (-29.0192, -39) -> (-26.7098, -39)
  line L556 (-26.7098, -39) -> (-25.5551, -37)
  line L557 (-25.5551, -37) -> (-26.7098, -35)
  line L558 (-22.3797, -37.5) -> (-24.6891, -37.5)
  line L559 (-24.6891, -37.5) -> (-25.5551, -39)
  line L560 (-21.5137, -39) -> (-22.3797, -37.5)
  line L561 (-52.6906, -25) -> (-55, -25)
  line L562 (-55, -25) -> (-56, -26.7321)
  line L563 (-56, -27.2679) -> (-55, -29)
  line L564 (-55, -29) -> (-52.6906, -29)
  line L565 (-52.6906, -29) -> (-51.5359, -27)
  line L566 (-51.5359, -27) -> (-52.6906, -25)
  line L567 (-48.3605, -27.5) -> (-50.6699, -27.5)
  line L568 (-50.6699, -27.5) -> (-51.8246, -29.5)
  line L569 (-51.8246, -29.5) -> (-50.6699, -31.5)
  line L570 (-50.6699, -31.5) -> (-48.3605, -31.5)
  line L571 (-48.3605, -31.5) -> (-47.2058, -29.5)
  line L572 (-47.2058, -29.5) -> (-48.3605, -27.5)
  line L573 (-44.0303, -30) -> (-46.3397, -30)
  line L574 (-46.3397, -30) -> (-47.4944, -32)
  line L575 (-47.4944, -32) -> (-46.3397, -34)
  line L576 (-46.3397, -34) -> (-44.0303, -34)
  line L577 (-44.0303, -34) -> (-42.8756, -32)
  line L578 (-42.8756, -32) -> (-44.0303, -30)
  line L579 (-39.7002, -32.5) -> (-42.0096, -32.5)
  line L580 (-42.0096, -32.5) -> (-43.1643, -34.5)
  line L581 (-43.1643, -34.5) -> (-42.0096, -36.5)
  line L582 (-42.0096, -36.5) -> (-39.7002, -36.5)
  line L583 (-39.7002, -36.5) -> (-38.5455, -34.5)
  line L584 (-38.5455, -34.5) -> (-39.7002, -32.5)
  line L585 (-35.3701, -35) -> (-37.6795, -35)
  line L586 (-37.6795, -35) -> (-38.8342, -37)
  line L587 (-38.8342, -37) -> (-37.6795, -39)
  line L588 (-37.6795, -39) -> (-35.3701, -39)
  line L589 (-35.3701, -39) -> (-34.2154, -37)
  line L590 (-34.2154, -37) -> (-35.3701, -35)
  line L591 (-31.04, -37.5) -> (-33.3494, -37.5)
  line L592 (-33.3494, -37.5) -> (-34.2154, -39)
  line L593 (-30.1739, -39) -> (-31.04, -37.5)
  line L594 (-52.6906, -30) -> (-55, -30)
  line L595 (-55, -30) -> (-56, -31.7321)
  line L596 (-56, -32.2679) -> (-55, -34)
  line L597 (-55, -34) -> (-52.6906, -34)
  line L598 (-52.6906, -34) -> (-51.5359, -32)
  line L599 (-51.5359, -32) -> (-52.6906, -30)
  line L600 (-48.3605, -32.5) -> (-50.6699, -32.5)
  line L601 (-50.6699, -32.5) -> (-51.8246, -34.5)
  line L602 (-51.8246, -34.5) -> (-50.6699, -36.5)
  line L603 (-50.6699, -36.5) -> (-48.3605, -36.5)
  line L604 (-48.3605, -36.5) -> (-47.2058, -34.5)
  line L605 (-47.2058, -34.5) -> (-48.3605, -32.5)
  line L606 (-44.0303, -35) -> (-46.3397, -35)
  line L607 (-46.3397, -35) -> (-47.4944, -37)
  line L608 (-47.4944, -37) -> (-46.3397, -39)
  line L609 (-46.3397, -39) -> (-44.0303, -39)
  line L610 (-44.0303, -39) -> (-42.8756, -37)
  line L611 (-42.8756, -37) -> (-44.0303, -35)
  line L612 (-39.7002, -37.5) -> (-42.0096, -37.5)
  line L613 (-42.0096, -37.5) -> (-42.8756, -39)
  line L614 (-38.8342, -39) -> (-39.7002, -37.5)
  line L615 (-52.6906, -35) -> (-55, -35)
  line L616 (-55, -35) -> (-56, -36.7321)
  line L617 (-56, -37.2679) -> (-55, -39)
  line L618 (-55, -39) -> (-52.6906, -39)
  line L619 (-52.6906, -39) -> (-51.5359, -37)
  line L620 (-51.5359, -37) -> (-52.6906, -35)
  line L621 (-48.3605, -37.5) -> (-50.6699, -37.5)
  line L622 (-50.6699, -37.5) -> (-51.5359, -39)
  line L623 (-47.4944, -39) -> (-48.3605, -37.5)
  line L624 (-56, -2.2679) -> (-56, -1.7321)
  line L625 (-55, 0) -> (-52.6906, 0)
  line L626 (-51.5359, 0) -> (-47.4944, 0)
  line L627 (-46.3397, 0) -> (-44.0303, 0)
  line L628 (-42.8756, 0) -> (-38.8342, 0)
  line L629 (-37.6795, 0) -> (-35.3701, 0)
  line L630 (-34.2154, 0) -> (-30.1739, 0)
  line L631 (-29.0192, 0) -> (-26.7098, 0)
  line L632 (-25.5551, 0) -> (-21.5137, 0)
  line L633 (-20.359, 0) -> (-18.0496, 0)
  line L634 (-16.8949, 0) -> (-12.8534, 0)
  line L635 (-11.6987, 0) -> (-9.3893, 0)
  line L636 (-8.2346, 0) -> (-4.1932, 0)
  line L637 (-3.0385, 0) -> (-0.7291, 0)
  line L638 (0, -1.2628) -> (0, -2.7372)
  line L639 (0, -6.2628) -> (0, -7.7372)
  line L640 (0, -11.2628) -> (0, -12.7372)
  line L641 (0, -16.2628) -> (0, -17.7372)
  line L642 (0, -21.2628) -> (0, -22.7372)
  line L643 (0, -26.2628) -> (0, -27.7372)
  line L644 (0, -31.2628) -> (0, -32.7372)
  line L645 (0, -36.2628) -> (0, -37.7372)
  line L646 (-0.7291, -39) -> (-3.0385, -39)
  line L647 (-4.1932, -39) -> (-8.2346, -39)
  line L648 (-9.3893, -39) -> (-11.6987, -39)
  line L649 (-12.8534, -39) -> (-16.8949, -39)
  line L650 (-18.0496, -39) -> (-20.359, -39)
  line L651 (-21.5137, -39) -> (-25.5551, -39)
  line L652 (-26.7098, -39) -> (-29.0192, -39)
  line L653 (-30.1739, -39) -> (-34.2154, -39)
  line L654 (-35.3701, -39) -> (-37.6795, -39)
  line L655 (-38.8342, -39) -> (-46.3397, -39)
  line L656 (-47.4944, -39) -> (-51.5359, -39)
  line L657 (-52.6906, -39) -> (-55, -39)
  line L658 (-56, -37.2679) -> (-56, -36.7321)
  line L659 (-56, -32.2679) -> (-56, -31.7321)
  line L660 (-56, -27.2679) -> (-56, -26.7321)
  line L661 (-56, -22.2679) -> (-56, -21.7321)
  line L662 (-56, -17.2679) -> (-56, -16.7321)
  line L663 (-56, -12.2679) -> (-56, -11.7321)
  line L664 (-56, -7.2679) -> (-56, -6.7321)
